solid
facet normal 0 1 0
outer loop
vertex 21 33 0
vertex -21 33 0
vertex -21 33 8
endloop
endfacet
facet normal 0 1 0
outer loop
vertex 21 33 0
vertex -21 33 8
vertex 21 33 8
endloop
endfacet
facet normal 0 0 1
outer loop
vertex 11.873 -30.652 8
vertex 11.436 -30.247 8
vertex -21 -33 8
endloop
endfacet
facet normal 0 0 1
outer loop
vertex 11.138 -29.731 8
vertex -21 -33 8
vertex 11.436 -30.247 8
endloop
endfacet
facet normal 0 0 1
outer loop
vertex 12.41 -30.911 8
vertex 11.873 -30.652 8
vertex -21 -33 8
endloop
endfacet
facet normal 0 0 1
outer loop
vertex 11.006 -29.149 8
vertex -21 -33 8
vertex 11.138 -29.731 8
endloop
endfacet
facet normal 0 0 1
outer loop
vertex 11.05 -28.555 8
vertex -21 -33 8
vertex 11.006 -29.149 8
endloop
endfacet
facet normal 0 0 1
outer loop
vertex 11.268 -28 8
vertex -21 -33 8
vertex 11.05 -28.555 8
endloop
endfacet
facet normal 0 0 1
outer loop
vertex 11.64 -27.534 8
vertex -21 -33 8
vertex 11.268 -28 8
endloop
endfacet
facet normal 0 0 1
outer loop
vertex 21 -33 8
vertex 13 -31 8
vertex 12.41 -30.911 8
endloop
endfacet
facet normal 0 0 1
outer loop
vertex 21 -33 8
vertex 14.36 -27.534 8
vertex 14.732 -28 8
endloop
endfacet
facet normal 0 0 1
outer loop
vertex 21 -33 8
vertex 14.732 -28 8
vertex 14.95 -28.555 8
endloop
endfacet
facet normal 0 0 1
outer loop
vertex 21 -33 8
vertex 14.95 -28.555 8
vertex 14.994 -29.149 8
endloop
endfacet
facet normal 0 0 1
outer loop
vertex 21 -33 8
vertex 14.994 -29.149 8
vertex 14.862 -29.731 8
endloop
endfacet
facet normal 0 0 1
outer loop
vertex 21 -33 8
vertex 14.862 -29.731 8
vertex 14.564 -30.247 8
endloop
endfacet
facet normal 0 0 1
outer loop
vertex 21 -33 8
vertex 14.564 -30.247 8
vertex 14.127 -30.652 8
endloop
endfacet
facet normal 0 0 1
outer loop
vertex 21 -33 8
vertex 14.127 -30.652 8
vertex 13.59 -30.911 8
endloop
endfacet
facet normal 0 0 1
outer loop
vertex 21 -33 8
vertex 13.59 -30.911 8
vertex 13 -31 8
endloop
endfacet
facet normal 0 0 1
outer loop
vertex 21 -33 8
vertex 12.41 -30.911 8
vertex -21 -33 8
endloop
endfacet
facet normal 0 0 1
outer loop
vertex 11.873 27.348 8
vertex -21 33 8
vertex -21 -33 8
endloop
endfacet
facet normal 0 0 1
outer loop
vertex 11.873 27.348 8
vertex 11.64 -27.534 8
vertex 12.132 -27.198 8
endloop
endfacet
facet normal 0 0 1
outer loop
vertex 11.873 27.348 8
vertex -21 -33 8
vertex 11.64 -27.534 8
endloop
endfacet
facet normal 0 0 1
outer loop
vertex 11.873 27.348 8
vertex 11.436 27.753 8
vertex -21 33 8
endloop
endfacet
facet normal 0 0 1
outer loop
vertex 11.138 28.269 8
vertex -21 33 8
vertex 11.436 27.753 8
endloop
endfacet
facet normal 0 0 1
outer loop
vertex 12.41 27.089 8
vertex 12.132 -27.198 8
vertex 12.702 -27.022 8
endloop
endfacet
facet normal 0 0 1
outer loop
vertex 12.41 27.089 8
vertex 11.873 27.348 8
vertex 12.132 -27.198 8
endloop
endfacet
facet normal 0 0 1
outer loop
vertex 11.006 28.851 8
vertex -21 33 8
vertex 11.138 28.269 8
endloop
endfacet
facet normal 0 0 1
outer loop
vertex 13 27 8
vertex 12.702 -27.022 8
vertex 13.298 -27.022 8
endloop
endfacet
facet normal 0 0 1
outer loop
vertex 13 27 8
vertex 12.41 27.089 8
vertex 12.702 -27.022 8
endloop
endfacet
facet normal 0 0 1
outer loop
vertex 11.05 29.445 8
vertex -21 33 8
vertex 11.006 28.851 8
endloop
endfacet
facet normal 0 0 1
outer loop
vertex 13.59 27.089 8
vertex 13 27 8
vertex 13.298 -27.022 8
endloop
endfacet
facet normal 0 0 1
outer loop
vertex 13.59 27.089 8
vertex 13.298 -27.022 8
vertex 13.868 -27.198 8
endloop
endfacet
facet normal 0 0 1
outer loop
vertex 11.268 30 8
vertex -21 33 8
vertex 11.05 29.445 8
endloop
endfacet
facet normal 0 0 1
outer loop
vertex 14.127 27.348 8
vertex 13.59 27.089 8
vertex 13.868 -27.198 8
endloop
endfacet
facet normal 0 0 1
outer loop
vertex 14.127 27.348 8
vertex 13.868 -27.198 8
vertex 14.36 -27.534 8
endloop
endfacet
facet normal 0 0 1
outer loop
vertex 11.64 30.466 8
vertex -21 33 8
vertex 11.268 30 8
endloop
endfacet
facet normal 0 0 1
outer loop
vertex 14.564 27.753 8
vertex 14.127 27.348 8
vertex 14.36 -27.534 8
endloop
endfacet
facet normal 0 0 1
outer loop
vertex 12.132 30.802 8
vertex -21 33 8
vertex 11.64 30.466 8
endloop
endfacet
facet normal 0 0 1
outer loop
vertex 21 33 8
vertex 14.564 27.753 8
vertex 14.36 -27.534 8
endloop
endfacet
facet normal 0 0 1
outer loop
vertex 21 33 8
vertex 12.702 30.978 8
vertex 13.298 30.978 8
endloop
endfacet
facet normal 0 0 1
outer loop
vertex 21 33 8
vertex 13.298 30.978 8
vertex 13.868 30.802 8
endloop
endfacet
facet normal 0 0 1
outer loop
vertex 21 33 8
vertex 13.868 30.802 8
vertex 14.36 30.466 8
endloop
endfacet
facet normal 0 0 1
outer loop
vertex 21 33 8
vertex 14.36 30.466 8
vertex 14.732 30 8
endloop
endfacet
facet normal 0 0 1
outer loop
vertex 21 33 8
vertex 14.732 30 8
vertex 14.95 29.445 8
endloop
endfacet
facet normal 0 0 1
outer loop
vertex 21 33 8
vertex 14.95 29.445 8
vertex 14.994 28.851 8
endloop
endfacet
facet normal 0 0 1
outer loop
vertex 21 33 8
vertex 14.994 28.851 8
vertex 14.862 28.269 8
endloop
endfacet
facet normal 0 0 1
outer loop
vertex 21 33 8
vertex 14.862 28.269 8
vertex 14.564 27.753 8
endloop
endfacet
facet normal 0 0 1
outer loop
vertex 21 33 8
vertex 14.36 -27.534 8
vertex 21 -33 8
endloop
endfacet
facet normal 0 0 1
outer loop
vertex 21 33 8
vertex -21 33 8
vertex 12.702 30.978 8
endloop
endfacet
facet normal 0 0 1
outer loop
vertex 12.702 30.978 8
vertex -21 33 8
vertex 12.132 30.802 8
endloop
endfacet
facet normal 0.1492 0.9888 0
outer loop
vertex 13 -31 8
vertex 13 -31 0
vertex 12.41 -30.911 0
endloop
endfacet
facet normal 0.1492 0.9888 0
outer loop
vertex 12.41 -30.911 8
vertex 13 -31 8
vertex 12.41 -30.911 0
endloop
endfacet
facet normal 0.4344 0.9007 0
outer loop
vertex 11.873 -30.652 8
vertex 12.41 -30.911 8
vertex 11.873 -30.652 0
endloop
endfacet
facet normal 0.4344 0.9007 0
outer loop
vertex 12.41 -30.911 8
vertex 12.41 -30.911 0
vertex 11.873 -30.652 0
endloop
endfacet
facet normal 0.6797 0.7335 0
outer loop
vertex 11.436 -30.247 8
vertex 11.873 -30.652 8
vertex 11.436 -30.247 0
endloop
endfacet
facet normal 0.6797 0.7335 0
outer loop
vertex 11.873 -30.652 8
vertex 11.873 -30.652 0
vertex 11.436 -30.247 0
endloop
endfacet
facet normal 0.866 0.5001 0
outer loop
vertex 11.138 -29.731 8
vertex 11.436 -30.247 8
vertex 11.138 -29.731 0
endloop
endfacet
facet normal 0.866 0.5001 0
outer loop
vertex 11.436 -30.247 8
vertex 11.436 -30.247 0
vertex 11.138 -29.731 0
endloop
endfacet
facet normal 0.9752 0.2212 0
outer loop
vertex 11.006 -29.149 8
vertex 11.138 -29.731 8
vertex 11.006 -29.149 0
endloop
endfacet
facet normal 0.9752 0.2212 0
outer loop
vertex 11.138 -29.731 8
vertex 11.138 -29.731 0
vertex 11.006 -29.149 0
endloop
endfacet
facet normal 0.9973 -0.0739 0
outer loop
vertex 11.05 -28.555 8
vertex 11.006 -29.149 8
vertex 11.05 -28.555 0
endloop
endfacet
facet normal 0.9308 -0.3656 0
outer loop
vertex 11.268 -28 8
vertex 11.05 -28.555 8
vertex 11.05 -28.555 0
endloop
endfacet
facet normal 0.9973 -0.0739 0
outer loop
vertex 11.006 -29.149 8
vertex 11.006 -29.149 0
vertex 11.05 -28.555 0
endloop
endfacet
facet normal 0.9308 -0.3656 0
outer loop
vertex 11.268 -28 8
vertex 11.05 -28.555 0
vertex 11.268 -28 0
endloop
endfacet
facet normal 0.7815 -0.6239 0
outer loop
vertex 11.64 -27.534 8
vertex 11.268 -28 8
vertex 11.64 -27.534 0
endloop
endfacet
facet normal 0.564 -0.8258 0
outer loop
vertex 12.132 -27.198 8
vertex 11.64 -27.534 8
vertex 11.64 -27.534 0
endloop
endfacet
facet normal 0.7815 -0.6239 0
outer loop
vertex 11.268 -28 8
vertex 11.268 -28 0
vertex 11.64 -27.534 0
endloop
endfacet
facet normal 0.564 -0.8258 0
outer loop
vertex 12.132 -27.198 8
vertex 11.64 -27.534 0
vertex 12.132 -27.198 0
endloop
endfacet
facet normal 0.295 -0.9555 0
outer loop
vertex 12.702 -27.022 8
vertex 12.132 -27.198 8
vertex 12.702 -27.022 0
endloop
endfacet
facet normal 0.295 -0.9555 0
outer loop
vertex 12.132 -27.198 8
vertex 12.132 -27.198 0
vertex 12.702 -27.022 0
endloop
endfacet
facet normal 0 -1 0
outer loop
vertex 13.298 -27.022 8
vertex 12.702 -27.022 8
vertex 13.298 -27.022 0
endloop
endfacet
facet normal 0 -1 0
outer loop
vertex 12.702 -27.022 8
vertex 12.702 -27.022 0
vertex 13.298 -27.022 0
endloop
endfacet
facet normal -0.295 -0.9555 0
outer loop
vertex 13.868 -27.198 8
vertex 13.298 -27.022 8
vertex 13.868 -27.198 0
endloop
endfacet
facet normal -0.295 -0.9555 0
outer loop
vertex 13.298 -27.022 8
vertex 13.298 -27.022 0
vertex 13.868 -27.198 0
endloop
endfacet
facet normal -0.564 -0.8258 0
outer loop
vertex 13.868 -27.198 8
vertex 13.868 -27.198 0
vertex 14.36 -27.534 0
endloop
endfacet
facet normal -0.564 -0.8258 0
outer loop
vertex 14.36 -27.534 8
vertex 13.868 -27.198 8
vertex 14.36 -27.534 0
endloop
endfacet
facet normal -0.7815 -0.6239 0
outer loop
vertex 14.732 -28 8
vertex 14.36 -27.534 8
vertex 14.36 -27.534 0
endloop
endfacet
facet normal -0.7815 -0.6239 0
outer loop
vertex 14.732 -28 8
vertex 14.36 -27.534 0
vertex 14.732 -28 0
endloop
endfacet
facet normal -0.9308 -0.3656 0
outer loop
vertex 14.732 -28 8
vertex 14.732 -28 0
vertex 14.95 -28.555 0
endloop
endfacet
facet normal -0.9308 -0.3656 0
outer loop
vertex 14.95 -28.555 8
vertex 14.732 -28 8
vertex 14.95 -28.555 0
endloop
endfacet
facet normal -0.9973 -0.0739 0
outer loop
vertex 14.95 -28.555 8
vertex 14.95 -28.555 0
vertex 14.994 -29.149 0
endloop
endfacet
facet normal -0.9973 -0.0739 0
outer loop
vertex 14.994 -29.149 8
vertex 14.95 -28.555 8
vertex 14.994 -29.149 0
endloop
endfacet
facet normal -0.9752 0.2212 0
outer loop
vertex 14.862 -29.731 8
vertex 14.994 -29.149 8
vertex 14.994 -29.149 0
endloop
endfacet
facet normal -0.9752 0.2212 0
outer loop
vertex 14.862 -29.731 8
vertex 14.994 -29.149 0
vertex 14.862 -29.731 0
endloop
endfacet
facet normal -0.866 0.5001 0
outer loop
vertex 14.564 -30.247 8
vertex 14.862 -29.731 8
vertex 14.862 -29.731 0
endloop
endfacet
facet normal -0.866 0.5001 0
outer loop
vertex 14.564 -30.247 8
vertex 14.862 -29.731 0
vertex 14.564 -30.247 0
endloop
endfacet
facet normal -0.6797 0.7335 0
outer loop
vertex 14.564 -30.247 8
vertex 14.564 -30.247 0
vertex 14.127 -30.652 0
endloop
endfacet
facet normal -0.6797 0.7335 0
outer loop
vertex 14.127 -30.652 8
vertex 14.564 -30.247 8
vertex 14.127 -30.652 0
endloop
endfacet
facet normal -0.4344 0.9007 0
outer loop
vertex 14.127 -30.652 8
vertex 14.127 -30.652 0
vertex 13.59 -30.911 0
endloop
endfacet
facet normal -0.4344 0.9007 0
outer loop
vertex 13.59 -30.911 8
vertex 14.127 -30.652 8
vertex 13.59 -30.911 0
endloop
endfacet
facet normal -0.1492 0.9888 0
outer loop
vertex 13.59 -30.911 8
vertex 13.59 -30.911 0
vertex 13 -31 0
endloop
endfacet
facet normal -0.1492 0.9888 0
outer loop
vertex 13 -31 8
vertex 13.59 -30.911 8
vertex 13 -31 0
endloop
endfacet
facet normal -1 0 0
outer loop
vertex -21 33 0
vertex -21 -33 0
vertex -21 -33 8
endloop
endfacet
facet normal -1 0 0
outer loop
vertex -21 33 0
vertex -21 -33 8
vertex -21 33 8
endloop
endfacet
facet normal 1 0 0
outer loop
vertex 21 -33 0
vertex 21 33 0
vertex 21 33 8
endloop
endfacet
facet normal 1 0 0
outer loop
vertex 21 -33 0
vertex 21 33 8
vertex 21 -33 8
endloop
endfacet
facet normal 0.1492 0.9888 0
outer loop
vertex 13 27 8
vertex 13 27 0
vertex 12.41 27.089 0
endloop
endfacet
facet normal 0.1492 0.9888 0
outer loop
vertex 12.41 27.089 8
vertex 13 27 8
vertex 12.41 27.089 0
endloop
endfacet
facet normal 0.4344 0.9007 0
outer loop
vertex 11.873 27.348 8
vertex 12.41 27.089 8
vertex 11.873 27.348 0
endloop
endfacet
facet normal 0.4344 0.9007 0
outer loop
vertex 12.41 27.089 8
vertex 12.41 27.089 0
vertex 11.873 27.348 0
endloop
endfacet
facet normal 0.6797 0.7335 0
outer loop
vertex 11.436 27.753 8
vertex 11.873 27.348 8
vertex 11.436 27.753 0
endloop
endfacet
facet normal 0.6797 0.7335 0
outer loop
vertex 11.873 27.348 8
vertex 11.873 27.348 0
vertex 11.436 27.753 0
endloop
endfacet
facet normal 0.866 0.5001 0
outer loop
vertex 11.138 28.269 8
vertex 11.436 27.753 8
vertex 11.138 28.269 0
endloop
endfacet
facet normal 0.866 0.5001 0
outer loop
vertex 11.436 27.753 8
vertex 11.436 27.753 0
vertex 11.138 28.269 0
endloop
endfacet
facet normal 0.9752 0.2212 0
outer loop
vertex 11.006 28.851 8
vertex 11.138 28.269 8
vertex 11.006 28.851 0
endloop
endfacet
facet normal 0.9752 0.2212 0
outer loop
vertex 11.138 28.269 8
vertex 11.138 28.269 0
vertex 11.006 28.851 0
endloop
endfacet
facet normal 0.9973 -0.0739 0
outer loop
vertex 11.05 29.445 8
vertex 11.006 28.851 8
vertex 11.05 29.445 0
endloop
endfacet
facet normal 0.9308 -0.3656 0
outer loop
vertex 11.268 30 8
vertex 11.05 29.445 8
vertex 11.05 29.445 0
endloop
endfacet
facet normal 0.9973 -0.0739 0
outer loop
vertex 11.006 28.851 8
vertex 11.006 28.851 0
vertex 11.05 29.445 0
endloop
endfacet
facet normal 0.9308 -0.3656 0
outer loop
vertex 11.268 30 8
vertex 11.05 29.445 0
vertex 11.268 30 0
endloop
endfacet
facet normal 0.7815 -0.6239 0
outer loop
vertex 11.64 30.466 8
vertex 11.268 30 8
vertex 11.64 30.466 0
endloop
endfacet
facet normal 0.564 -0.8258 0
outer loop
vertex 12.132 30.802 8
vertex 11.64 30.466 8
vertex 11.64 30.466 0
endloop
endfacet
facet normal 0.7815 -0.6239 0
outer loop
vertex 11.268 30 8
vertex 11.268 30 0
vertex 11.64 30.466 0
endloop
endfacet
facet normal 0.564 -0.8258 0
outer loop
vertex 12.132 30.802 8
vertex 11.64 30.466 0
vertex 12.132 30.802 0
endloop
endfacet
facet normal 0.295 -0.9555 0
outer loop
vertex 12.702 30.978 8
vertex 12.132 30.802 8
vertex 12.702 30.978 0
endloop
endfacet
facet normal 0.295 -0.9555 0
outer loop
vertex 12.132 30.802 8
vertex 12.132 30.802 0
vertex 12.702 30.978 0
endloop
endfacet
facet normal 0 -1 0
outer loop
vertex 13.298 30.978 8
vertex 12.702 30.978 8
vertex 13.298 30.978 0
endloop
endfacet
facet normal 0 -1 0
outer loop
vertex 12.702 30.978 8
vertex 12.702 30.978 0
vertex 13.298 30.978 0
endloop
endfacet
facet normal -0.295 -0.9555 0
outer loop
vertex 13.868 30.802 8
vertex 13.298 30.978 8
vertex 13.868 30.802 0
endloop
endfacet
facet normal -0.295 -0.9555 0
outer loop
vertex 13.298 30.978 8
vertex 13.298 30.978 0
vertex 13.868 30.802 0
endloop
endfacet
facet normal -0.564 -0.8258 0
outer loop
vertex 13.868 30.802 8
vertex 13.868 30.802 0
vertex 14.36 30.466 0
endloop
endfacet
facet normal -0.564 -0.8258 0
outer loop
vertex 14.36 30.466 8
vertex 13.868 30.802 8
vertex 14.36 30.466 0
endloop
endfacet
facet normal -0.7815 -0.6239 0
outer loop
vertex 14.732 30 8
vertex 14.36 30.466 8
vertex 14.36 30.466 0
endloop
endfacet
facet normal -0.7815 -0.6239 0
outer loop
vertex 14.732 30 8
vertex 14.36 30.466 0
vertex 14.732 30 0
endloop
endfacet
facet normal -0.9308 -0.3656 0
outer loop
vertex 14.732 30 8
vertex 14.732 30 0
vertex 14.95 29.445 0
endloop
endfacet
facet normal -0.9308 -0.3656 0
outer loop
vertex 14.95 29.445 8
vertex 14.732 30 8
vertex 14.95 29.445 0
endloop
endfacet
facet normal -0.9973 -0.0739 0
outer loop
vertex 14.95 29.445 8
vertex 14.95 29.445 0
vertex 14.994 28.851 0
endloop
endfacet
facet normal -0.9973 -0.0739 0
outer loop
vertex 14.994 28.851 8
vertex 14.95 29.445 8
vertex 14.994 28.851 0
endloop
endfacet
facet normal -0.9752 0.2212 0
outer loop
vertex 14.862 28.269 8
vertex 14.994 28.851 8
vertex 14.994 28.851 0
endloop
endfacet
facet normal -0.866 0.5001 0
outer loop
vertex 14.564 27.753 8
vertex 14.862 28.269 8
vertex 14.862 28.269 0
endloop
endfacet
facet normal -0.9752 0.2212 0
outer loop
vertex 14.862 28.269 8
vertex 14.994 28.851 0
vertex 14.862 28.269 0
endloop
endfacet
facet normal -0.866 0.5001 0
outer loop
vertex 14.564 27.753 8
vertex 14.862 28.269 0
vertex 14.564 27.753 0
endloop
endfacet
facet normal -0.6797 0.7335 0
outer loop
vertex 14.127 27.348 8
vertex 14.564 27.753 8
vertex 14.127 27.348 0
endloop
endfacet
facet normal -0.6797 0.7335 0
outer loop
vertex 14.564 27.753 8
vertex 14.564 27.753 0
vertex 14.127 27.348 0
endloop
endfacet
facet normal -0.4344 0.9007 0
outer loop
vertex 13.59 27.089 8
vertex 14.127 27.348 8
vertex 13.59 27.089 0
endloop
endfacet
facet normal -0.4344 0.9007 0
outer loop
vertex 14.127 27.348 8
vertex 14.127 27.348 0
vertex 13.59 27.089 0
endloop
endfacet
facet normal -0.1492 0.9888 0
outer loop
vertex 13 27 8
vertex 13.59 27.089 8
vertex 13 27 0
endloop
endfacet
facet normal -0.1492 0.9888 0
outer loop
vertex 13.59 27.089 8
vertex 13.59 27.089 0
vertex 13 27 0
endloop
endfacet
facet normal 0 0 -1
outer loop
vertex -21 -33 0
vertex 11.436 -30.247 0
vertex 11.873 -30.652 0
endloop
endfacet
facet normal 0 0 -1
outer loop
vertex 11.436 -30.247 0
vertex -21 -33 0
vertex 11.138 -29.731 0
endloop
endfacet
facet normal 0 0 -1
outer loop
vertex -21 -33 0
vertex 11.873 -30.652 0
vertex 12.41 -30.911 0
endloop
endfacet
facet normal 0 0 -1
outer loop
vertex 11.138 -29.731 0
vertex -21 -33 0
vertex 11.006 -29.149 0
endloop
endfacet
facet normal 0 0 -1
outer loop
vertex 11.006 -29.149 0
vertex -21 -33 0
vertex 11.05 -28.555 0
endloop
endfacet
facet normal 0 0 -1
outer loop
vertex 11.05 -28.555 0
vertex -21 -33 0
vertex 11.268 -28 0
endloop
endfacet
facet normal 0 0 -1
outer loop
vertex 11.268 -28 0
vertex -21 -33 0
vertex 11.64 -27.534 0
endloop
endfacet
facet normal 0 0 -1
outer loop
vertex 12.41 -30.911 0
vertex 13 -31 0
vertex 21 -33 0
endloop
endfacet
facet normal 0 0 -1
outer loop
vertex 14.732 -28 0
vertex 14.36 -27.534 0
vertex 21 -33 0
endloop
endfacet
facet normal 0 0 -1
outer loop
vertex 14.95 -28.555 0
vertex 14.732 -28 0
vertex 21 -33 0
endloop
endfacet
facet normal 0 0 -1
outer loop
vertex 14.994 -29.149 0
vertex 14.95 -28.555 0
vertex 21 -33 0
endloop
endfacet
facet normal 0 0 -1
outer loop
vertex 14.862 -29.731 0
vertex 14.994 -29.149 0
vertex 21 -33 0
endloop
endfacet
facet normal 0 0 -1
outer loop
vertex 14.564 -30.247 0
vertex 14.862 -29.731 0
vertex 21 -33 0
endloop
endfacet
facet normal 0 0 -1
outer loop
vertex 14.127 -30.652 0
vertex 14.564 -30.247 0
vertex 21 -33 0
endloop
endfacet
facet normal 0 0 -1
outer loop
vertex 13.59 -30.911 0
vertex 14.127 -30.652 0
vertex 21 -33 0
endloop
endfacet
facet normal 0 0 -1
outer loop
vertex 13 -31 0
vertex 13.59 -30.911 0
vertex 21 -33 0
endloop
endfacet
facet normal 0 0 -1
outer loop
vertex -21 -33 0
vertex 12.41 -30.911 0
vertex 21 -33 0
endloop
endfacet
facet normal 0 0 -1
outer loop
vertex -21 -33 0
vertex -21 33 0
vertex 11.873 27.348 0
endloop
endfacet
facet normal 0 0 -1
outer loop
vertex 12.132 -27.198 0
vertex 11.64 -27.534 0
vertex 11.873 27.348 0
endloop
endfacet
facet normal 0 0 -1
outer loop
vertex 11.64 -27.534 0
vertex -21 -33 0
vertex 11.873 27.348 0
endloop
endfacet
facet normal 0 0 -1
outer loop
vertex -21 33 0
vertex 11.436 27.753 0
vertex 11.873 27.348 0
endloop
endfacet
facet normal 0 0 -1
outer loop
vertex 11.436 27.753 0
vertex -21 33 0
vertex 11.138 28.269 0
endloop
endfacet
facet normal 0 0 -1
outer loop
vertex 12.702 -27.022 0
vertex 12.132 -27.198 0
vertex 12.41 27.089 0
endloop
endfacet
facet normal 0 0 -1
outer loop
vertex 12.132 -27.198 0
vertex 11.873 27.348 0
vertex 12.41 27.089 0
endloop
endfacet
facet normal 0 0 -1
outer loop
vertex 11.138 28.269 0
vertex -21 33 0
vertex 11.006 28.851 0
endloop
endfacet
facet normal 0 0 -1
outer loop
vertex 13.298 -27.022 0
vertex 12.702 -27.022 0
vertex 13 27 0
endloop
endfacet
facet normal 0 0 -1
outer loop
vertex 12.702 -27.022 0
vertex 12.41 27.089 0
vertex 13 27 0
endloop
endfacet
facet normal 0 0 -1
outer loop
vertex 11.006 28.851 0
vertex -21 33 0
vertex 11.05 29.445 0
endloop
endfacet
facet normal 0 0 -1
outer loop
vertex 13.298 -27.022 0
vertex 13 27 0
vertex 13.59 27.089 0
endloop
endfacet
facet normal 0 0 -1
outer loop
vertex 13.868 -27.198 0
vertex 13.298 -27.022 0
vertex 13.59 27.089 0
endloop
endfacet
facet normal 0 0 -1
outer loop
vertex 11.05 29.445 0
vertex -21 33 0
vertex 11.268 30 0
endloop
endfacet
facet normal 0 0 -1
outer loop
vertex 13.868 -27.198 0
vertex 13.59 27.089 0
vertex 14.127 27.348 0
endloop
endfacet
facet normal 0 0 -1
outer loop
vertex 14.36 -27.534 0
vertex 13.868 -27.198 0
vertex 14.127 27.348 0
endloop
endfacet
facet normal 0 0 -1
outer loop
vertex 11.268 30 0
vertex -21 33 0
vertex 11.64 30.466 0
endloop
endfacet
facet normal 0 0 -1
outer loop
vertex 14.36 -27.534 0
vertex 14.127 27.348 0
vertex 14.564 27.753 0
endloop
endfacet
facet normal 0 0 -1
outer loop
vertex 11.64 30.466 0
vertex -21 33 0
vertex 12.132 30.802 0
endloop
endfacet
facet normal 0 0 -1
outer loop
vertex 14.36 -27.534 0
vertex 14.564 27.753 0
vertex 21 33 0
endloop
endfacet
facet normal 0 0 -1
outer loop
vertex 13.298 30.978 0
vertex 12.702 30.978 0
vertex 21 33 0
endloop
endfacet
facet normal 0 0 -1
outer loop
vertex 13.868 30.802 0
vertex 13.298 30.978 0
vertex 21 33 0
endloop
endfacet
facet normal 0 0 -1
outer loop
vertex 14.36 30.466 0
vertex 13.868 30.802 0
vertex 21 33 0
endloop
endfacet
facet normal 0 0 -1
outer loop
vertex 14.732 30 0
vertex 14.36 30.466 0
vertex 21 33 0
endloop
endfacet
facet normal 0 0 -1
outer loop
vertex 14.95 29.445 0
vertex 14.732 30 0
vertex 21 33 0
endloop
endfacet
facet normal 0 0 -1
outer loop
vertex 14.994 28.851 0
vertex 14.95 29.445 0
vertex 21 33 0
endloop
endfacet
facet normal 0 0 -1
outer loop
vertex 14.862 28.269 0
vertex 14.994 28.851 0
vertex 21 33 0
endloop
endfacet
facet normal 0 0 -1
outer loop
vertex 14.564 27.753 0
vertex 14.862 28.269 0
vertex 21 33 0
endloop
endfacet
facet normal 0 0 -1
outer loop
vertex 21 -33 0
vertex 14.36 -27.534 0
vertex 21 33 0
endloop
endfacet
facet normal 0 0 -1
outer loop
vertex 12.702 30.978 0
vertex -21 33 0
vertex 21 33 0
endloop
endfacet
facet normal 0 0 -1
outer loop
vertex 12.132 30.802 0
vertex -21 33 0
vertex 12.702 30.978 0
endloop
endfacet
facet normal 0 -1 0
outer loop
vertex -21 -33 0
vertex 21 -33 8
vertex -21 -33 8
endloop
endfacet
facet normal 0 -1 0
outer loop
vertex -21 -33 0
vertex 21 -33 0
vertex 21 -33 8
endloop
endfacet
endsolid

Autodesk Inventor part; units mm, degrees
ref_plane "YZ Plane" through (0, 0, 0) normal (1, 0, 0) x (0, 1, 0)
ref_plane "XZ Plane" through (0, 0, 0) normal (0, 1, 0) x (-1, 0, 0)
ref_plane "XY Plane" through (0, 0, 0) normal (0, 0, 1) x (1, 0, 0)
sketch "Sketch1" plane through (0, 0, 0) normal (0, 0, 1) x (1, 0, 0)
  line L0 (-21, 33) -> (21, 33)
  line L1 (21, 33) -> (21, -33)
  line L2 (21, -33) -> (-21, -33)
  line L3 (-21, -33) -> (-21, 33)
  point P0 (0, 0)
  point P1 (0, 33)
  point P2 (-21, 0)
  dimension "d0" = 42
  dimension "d1" = 66
extrude "Extrusion1" add sketch "Sketch1" along normal blind 8
sketch "Sketch4" plane through (0, 0, 8) normal (0, 0, 1) x (1, 0, 0)
  line L0 (-21, -33) -> (21, -33) projected
  line L1 (21, 33) -> (-21, 33) projected
  line L2 (21, -33) -> (21, 33) projected
  point P0 (0, 0)
  point P1 (13, -29)
  point P2 (13, 29)
  dimension "d19" = 4
  dimension "d20" = 4
  dimension "d21" = 8
hole "Hole1" at (13, -29, 8) at (13, 29, 8) direction (0, 0, -1) diameter 4 end through all
properties part number "0005-10-016"
